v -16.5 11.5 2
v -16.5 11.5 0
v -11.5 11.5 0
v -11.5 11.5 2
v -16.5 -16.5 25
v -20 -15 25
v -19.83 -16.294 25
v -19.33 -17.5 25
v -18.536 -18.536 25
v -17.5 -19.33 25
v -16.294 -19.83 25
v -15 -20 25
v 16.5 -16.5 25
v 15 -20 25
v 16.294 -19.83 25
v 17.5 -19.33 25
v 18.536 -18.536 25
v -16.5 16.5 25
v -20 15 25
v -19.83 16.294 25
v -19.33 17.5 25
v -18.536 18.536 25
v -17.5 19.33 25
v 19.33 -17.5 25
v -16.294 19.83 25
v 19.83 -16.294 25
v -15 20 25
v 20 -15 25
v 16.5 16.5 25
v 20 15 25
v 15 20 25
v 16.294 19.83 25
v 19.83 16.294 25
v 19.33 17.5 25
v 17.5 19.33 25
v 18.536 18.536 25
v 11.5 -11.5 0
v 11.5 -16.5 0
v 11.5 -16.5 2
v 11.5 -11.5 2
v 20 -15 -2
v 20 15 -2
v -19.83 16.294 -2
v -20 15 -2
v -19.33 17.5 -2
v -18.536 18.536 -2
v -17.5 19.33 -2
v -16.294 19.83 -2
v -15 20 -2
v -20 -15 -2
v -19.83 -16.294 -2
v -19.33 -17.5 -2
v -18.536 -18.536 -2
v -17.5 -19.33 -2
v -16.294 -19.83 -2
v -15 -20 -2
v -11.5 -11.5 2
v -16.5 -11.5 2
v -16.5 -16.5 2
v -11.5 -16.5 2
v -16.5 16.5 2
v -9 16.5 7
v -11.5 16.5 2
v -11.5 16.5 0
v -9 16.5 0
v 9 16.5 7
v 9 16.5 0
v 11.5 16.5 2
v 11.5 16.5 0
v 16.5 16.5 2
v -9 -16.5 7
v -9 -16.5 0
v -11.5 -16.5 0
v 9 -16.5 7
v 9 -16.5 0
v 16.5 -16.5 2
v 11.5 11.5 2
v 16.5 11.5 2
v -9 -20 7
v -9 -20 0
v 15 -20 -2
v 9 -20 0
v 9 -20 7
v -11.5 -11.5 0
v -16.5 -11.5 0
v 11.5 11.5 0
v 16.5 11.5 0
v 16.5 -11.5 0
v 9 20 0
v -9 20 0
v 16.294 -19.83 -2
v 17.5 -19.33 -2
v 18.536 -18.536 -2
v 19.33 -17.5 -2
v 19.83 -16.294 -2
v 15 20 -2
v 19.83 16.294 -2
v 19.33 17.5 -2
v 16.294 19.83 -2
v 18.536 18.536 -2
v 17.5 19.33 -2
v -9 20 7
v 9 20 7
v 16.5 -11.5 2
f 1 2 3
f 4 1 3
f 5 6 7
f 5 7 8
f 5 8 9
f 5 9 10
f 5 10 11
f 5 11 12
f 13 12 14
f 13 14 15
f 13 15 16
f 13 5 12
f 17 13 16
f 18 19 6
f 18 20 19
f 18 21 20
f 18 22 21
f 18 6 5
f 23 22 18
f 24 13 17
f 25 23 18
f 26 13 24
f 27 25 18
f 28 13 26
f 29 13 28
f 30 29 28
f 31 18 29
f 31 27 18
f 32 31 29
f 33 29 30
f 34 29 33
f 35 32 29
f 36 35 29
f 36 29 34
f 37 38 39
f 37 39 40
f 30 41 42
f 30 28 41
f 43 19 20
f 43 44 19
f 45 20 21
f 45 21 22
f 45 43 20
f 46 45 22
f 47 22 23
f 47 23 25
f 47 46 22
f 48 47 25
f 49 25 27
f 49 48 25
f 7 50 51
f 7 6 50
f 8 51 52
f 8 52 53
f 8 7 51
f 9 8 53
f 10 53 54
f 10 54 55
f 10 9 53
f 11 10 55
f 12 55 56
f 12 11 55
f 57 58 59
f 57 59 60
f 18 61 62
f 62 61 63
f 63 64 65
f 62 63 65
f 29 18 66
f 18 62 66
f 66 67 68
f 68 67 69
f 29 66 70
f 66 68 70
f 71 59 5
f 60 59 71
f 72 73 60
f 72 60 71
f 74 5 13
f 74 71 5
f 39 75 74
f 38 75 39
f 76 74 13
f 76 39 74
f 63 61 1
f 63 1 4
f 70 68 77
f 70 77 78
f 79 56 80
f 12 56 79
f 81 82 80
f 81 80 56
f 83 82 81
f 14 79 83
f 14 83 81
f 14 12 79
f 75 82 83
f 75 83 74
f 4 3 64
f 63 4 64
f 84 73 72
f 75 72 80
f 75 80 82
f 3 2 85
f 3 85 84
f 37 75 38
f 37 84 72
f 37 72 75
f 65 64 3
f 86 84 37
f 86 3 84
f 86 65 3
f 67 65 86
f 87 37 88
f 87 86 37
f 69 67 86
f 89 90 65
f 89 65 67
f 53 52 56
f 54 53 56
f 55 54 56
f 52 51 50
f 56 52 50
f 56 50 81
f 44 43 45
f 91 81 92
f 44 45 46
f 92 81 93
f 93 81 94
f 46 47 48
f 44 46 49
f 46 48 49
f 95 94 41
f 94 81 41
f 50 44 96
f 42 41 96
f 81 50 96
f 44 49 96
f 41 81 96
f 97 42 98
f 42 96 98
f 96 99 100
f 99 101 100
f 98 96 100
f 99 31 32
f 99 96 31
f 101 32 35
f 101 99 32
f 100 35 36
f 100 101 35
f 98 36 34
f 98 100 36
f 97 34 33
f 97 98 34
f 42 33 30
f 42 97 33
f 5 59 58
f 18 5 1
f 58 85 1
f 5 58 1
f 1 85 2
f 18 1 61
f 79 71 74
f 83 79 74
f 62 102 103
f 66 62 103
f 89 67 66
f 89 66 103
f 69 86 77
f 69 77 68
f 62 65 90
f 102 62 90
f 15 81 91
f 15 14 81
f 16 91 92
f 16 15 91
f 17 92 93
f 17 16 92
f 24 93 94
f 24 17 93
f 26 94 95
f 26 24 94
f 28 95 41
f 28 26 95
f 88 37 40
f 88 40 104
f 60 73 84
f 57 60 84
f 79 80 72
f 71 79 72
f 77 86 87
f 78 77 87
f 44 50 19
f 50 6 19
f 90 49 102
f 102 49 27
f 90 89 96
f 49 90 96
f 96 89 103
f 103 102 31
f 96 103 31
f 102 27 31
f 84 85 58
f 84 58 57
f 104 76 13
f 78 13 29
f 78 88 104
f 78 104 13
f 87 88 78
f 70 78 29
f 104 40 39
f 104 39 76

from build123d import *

# Parameters (mm, degrees)
F0_W     = 40
F0_H     = 40
F0_W_2   = 33
F0_H_2   = 33
F1_DEPTH = 25
F2_W     = 40
F2_H     = 40
F3_DEPTH = 2
F4_W     = 5
F4_H     = 5
F5_DEPTH = 2
F6_W     = 18
F6_H     = 3.5
F7_DEPTH = 7
F8_R     = 5


with BuildPart() as f1:
    # F0 (on Top) → F1 (new body)
    with BuildSketch(Plane.XY):
        Rectangle(F0_W, F0_H)
        Rectangle(F0_W_2, F0_H_2, mode=Mode.SUBTRACT)
    extrude(amount=F1_DEPTH)

    # F2 (on Top) → F3 (join)
    with BuildSketch(Plane.XY):
        Rectangle(F2_W, F2_H)
    extrude(amount=-F3_DEPTH)

    # F4 (on face) → F5 (join)
    with BuildSketch(Plane.XY):
        with Locations((-14, 14)):
            Rectangle(F4_W, F4_H)
        with Locations((14, 14)):
            Rectangle(F4_W, F4_H)
        with Locations((-14, -14)):
            Rectangle(F4_W, F4_H)
        with Locations((14, -14)):
            Rectangle(F4_W, F4_H)
    extrude(amount=F5_DEPTH)

    # F6 (on face) → F7 (cut)
    with BuildSketch(Plane.XY):
        with Locations((0, -18.25)):
            Rectangle(F6_W, F6_H)
        with Locations((0, 18.25)):
            Rectangle(F6_W, F6_H)
    extrude(amount=F7_DEPTH, mode=Mode.SUBTRACT)

    # F8
    f8_edges = [f1.edges().sort_by_distance(p)[0] for p in [
        (20, -20, 11.5),
        (-20, -20, 11.5),
        (20, 20, 11.5),
        (-20, 20, 11.5),
    ]]
    fillet(f8_edges, radius=F8_R)


solid = f1.part
